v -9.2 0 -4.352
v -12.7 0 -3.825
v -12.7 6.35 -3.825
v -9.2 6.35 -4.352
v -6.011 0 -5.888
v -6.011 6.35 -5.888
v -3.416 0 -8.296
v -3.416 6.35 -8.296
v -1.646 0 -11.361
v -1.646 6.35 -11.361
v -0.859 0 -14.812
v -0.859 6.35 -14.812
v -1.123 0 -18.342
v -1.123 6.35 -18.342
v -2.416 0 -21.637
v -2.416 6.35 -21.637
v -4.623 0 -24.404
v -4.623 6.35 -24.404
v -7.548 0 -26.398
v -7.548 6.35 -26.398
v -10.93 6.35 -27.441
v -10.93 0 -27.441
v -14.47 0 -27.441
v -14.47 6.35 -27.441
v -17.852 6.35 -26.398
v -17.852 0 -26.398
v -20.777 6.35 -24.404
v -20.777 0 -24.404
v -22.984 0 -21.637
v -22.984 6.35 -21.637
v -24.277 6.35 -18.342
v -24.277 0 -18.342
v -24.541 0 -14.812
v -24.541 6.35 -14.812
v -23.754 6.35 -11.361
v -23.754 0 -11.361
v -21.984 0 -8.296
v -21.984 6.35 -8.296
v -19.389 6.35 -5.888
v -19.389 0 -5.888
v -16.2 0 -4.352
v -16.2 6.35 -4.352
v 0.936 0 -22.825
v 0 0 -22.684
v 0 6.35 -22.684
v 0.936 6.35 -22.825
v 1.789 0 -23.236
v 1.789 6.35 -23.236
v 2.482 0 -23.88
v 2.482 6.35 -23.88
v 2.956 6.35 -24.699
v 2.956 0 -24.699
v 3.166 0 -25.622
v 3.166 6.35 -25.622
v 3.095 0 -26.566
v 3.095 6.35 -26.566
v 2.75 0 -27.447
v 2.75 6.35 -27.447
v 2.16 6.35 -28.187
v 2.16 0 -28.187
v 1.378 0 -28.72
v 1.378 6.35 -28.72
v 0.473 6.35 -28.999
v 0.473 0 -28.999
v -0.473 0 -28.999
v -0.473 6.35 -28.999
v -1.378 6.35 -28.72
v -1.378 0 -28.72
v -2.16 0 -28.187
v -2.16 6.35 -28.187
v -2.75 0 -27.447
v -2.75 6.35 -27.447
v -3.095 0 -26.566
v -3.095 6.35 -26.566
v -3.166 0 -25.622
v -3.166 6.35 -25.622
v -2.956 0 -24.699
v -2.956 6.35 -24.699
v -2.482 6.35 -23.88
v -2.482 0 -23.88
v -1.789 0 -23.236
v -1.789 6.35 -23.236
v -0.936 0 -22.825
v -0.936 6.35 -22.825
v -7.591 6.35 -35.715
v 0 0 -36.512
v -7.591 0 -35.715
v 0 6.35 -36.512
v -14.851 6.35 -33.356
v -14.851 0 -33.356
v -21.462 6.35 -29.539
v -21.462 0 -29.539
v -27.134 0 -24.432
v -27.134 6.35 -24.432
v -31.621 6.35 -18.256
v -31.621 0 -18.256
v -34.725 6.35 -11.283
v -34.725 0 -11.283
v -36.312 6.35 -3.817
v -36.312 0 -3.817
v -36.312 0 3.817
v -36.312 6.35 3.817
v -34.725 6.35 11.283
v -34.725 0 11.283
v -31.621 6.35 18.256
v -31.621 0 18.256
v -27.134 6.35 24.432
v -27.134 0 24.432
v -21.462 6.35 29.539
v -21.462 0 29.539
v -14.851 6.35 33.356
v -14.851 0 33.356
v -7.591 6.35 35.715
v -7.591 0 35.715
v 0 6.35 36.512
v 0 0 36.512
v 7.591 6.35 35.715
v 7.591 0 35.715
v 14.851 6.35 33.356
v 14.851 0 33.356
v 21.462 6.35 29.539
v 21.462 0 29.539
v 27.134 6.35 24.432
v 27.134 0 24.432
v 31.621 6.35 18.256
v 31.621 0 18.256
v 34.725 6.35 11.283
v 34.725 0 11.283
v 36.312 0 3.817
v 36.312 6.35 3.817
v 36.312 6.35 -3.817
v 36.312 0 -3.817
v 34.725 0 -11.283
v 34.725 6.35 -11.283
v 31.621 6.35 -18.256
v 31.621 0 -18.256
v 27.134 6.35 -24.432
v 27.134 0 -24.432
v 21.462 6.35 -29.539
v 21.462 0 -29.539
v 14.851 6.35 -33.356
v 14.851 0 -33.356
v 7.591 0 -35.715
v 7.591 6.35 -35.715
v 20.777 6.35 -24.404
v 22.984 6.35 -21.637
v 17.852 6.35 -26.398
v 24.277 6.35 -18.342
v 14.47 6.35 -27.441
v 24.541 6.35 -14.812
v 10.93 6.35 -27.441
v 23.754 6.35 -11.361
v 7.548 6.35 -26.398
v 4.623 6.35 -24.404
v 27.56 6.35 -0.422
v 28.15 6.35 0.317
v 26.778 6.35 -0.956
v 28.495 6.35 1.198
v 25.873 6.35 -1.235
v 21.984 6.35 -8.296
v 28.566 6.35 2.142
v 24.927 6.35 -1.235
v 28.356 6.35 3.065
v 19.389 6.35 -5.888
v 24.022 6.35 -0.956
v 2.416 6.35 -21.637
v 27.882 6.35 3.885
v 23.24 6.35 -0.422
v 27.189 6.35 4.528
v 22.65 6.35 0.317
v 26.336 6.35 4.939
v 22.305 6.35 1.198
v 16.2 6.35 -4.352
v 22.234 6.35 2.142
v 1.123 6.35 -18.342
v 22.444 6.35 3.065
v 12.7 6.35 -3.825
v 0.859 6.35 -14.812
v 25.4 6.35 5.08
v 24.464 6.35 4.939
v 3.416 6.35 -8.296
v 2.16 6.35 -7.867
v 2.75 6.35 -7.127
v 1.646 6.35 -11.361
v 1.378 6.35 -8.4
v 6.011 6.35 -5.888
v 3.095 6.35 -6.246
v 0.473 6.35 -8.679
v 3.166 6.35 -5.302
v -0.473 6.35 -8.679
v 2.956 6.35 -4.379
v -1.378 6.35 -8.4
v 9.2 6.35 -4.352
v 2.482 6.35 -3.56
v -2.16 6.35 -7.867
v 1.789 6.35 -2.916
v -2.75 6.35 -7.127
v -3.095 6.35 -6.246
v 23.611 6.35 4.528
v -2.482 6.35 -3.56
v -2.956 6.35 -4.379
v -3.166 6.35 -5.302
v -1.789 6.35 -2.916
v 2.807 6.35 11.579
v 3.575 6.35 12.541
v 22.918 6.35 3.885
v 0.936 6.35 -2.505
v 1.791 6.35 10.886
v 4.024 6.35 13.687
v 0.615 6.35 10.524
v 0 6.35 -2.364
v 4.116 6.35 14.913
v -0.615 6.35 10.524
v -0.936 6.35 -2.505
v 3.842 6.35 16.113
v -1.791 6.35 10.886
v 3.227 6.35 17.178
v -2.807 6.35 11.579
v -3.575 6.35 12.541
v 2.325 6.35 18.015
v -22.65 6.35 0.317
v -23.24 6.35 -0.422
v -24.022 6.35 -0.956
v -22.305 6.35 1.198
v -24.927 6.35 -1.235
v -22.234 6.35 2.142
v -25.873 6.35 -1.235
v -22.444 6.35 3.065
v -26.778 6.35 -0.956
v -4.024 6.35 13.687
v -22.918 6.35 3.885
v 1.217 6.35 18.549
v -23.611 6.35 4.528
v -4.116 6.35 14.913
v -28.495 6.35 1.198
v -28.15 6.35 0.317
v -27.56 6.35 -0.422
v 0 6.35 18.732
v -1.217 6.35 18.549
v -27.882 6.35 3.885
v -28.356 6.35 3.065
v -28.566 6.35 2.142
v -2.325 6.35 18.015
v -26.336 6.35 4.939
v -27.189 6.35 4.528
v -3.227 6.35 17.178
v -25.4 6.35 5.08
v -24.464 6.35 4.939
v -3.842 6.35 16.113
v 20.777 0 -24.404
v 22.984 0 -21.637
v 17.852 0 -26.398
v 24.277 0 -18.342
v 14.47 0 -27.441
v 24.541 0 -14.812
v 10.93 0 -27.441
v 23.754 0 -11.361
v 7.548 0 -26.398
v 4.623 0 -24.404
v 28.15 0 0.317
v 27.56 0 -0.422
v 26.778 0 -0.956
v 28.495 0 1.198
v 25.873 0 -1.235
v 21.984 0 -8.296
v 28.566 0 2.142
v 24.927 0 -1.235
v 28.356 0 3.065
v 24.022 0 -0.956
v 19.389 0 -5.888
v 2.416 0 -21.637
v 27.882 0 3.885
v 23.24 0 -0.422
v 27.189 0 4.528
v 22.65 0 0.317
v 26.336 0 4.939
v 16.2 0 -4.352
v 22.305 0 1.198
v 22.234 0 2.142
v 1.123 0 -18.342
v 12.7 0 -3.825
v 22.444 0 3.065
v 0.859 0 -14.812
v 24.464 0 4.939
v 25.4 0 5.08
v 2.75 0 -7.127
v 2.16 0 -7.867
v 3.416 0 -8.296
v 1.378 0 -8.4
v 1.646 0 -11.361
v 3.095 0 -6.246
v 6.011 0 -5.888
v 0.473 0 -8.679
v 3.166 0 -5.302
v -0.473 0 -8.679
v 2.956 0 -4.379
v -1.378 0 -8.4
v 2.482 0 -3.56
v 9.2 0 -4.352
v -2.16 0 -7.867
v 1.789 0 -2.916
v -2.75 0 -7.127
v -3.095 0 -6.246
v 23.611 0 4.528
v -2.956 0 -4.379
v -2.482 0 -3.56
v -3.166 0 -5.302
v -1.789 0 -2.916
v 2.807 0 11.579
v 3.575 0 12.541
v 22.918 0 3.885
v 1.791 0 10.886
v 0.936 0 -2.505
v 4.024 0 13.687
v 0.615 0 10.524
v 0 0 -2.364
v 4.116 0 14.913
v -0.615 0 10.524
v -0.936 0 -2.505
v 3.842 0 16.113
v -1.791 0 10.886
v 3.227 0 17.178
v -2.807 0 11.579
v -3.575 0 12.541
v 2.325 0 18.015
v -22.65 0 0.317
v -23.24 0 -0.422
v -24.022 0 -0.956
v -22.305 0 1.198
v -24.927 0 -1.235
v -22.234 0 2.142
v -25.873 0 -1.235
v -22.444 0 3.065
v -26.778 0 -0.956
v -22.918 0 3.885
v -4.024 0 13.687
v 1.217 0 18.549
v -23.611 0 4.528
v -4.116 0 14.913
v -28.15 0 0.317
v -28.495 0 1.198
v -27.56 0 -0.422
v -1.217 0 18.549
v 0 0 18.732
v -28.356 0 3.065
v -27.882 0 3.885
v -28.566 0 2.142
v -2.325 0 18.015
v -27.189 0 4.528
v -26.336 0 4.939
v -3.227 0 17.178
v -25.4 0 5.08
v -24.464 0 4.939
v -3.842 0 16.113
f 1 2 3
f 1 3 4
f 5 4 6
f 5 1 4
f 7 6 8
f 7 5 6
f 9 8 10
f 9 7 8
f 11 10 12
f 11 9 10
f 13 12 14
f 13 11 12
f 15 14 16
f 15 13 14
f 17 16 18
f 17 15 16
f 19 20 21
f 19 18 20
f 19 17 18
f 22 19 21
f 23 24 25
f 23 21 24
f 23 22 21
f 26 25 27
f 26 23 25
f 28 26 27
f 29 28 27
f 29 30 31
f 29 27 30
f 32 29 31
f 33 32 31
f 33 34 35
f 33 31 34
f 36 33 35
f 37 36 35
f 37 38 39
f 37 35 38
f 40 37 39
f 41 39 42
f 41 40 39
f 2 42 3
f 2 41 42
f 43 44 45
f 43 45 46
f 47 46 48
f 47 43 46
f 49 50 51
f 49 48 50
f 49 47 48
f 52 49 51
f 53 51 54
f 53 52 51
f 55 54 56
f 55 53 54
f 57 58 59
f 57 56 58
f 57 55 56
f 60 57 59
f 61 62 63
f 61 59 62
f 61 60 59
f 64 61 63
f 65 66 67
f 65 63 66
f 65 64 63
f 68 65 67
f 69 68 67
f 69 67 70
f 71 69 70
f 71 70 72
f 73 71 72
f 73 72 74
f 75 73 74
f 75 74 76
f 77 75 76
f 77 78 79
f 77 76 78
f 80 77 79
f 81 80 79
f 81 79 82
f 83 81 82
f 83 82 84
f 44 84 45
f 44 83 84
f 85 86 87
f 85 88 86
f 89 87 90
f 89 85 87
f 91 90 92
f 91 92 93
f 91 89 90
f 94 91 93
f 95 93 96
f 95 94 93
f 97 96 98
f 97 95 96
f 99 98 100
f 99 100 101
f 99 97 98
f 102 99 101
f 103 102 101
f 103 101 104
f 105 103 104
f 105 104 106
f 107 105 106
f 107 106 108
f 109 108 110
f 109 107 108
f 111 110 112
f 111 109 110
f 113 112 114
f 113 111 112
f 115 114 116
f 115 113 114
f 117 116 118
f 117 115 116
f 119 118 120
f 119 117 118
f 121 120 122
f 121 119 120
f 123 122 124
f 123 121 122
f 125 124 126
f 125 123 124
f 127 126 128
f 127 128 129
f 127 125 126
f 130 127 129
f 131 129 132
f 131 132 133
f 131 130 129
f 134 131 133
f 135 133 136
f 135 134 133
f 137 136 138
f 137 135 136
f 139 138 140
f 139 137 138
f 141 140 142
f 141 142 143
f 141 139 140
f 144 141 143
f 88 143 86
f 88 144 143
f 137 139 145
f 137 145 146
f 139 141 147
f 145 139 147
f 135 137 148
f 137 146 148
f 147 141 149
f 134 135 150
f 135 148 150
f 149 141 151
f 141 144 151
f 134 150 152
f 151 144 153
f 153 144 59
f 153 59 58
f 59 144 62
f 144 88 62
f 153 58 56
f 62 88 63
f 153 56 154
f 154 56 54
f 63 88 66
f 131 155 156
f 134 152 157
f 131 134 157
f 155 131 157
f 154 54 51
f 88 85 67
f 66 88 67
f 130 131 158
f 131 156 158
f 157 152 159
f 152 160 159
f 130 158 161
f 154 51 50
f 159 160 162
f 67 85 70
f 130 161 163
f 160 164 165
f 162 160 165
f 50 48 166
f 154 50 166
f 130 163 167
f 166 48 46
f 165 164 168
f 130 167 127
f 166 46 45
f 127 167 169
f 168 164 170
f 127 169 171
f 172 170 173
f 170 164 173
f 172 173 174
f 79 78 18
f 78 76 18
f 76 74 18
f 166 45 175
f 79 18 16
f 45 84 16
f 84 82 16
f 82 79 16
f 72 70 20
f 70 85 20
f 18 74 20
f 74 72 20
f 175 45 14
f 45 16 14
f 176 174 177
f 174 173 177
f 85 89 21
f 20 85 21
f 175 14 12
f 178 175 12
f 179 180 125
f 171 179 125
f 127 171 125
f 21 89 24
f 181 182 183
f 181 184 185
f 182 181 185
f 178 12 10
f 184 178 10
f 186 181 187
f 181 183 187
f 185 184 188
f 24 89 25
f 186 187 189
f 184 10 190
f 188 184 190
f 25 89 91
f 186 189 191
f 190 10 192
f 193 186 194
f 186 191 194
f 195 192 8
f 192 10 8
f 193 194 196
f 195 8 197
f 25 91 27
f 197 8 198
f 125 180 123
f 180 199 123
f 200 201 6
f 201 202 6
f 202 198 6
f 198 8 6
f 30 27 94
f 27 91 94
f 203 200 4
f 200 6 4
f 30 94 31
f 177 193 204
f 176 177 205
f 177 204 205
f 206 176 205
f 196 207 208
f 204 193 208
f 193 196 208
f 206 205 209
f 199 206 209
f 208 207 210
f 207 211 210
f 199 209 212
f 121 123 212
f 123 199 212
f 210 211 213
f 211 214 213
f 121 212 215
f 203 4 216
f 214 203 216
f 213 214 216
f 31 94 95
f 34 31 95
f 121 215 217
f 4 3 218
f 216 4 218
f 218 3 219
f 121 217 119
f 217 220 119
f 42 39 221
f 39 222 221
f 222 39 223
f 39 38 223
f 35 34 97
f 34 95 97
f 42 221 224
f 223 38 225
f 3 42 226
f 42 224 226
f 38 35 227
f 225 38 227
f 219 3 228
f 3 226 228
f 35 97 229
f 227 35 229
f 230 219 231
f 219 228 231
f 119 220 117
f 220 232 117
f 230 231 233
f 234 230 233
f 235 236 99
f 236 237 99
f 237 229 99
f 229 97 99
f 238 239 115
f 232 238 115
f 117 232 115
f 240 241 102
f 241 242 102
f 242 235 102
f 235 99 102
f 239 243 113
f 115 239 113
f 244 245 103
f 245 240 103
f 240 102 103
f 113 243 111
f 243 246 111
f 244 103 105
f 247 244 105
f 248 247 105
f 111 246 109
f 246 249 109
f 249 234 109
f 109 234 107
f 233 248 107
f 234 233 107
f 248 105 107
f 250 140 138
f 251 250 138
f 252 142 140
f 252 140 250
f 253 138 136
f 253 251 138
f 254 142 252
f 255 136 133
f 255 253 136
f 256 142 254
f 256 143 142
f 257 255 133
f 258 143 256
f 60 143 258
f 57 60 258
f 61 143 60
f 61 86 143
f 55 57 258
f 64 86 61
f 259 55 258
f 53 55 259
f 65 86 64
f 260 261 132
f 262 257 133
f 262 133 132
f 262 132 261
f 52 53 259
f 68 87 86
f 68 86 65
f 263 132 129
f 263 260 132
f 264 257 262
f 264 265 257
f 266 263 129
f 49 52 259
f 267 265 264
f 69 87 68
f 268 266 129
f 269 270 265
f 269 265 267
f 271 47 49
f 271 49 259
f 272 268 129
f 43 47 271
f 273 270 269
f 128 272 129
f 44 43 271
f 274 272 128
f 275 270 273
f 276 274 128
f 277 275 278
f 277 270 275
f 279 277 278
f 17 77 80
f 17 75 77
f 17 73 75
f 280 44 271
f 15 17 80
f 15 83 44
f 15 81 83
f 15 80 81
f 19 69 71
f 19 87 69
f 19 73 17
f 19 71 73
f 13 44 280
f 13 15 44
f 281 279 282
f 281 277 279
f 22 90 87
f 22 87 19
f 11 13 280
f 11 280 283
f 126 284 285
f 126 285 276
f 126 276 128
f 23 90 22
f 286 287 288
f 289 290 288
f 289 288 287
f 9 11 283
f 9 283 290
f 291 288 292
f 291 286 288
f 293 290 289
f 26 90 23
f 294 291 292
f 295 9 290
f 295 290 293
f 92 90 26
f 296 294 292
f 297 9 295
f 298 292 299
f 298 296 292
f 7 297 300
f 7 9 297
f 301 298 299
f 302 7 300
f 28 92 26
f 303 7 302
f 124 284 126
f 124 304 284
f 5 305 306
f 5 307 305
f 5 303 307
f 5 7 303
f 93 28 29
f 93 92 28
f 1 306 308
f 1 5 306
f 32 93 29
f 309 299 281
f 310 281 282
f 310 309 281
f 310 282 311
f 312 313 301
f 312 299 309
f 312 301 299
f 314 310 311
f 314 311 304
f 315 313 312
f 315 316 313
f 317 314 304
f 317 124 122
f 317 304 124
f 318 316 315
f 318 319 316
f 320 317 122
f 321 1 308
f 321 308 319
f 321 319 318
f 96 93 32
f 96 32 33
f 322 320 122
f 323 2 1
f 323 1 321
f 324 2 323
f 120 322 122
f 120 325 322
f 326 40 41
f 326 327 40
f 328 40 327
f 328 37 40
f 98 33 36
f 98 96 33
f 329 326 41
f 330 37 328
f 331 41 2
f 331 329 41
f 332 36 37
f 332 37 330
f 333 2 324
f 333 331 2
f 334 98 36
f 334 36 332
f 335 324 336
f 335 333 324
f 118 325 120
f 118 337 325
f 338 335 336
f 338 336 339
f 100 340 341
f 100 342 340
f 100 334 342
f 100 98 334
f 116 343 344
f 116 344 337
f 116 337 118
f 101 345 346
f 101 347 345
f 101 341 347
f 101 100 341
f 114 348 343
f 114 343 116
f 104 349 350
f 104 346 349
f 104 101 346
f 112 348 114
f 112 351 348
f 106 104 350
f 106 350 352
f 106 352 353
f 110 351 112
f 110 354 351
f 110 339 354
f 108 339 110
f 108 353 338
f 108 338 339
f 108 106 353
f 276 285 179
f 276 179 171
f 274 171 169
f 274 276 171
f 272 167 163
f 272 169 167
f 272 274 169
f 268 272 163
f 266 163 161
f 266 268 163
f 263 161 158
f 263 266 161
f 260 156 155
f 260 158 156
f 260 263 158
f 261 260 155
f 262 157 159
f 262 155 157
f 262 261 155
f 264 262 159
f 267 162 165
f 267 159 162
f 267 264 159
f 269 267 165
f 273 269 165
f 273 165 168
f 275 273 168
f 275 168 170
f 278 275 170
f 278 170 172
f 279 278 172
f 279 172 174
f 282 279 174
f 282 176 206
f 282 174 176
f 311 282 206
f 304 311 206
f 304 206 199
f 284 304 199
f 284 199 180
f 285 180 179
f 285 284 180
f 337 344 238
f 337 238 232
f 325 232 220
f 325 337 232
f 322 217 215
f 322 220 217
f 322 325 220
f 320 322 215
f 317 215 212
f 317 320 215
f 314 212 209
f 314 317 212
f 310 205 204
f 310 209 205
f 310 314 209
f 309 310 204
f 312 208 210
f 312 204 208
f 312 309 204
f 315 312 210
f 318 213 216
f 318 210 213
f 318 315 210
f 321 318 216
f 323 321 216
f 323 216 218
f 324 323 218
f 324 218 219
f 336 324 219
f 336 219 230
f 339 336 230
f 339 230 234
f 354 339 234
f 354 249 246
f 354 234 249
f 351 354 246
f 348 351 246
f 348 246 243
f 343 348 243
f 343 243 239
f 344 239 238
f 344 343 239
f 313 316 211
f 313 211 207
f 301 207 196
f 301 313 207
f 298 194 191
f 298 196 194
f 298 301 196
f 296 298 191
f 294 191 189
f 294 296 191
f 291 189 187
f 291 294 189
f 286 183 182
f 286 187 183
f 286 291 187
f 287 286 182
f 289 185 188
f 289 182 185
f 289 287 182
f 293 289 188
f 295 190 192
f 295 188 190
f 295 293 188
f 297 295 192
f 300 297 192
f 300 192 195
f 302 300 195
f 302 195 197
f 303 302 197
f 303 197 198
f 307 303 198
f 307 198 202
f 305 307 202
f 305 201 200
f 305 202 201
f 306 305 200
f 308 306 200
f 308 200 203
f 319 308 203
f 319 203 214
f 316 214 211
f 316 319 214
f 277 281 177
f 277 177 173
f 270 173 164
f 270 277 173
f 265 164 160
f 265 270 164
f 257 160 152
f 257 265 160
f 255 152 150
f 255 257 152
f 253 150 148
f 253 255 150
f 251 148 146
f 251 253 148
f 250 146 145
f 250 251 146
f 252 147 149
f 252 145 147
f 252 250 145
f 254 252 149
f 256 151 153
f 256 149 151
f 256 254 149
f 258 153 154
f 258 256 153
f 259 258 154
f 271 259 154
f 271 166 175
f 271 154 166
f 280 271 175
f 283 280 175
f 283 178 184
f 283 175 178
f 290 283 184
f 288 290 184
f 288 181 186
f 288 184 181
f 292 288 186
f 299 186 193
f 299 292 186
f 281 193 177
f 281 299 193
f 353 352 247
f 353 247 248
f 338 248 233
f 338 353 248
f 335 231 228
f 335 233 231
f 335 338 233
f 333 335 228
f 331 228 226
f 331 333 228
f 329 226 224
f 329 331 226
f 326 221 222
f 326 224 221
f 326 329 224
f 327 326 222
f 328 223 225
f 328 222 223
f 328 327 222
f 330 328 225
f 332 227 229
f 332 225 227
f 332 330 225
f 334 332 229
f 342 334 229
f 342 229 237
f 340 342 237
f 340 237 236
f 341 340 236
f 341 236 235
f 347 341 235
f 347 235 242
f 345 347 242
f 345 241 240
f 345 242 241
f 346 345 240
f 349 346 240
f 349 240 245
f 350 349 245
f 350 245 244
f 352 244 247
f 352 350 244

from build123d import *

# Parameters (mm, degrees)
SKETCH1_W               = 36.5125
SKETCH1_H               = 6.35
CUT_EXTRUDE1_DEPTH      = 53.025453506
CUT_EXTRUDE1_DEPTH_BACK = 53.025453506
SKETCH2_R               = 11.8745
SKETCH2_R_2             = 3.175
SKETCH2_R_3             = 4.1275
CUT_EXTRUDE2_DEPTH      = 53.025453506
CUT_EXTRUDE2_DEPTH_BACK = 53.025453506
SKETCH3_R               = 3.175


with BuildPart() as part:
    # Sketch1 → Revolve1 (revolve)
    with BuildSketch(Plane.XY):
        with Locations((18.25625, 3.175)):
            Rectangle(SKETCH1_W, SKETCH1_H)
    revolve(axis=Axis((0, 0, 0), (0, 1, 0)))

    # Sketch2 → Cut-Extrude1 (cut, two sides: drawn at the far end of the back side and taken through both)
    with BuildSketch(Plane(origin=(0, 6.35, 0), x_dir=(1, 0, 0), z_dir=(0, 1, 0)).offset(-CUT_EXTRUDE1_DEPTH_BACK)):
        with Locations((-12.7, 15.699275429)):
            Circle(SKETCH2_R)
        with Locations((12.7, 15.699275429)):
            Circle(SKETCH2_R)
        with Locations((0, 25.859275429)):
            Circle(SKETCH2_R_2)
        with Locations((0, 5.539275429)):
            Circle(SKETCH2_R_2)
        with Locations((0, -14.605)):
            Circle(SKETCH2_R_3)
    extrude(amount=CUT_EXTRUDE1_DEPTH + CUT_EXTRUDE1_DEPTH_BACK, mode=Mode.SUBTRACT)

    # Sketch3 → Cut-Extrude2 (cut, two sides: drawn at the far end of the back side and taken through both)
    with BuildSketch(Plane(origin=(0, 6.35, 0), x_dir=(1, 0, 0), z_dir=(0, 1, 0)).offset(-CUT_EXTRUDE2_DEPTH_BACK)):
        with Locations((-25.4, -1.905)):
            Circle(SKETCH3_R)
        with Locations((25.4, -1.905)):
            Circle(SKETCH3_R)
    extrude(amount=CUT_EXTRUDE2_DEPTH + CUT_EXTRUDE2_DEPTH_BACK, mode=Mode.SUBTRACT)


solid = part.part
